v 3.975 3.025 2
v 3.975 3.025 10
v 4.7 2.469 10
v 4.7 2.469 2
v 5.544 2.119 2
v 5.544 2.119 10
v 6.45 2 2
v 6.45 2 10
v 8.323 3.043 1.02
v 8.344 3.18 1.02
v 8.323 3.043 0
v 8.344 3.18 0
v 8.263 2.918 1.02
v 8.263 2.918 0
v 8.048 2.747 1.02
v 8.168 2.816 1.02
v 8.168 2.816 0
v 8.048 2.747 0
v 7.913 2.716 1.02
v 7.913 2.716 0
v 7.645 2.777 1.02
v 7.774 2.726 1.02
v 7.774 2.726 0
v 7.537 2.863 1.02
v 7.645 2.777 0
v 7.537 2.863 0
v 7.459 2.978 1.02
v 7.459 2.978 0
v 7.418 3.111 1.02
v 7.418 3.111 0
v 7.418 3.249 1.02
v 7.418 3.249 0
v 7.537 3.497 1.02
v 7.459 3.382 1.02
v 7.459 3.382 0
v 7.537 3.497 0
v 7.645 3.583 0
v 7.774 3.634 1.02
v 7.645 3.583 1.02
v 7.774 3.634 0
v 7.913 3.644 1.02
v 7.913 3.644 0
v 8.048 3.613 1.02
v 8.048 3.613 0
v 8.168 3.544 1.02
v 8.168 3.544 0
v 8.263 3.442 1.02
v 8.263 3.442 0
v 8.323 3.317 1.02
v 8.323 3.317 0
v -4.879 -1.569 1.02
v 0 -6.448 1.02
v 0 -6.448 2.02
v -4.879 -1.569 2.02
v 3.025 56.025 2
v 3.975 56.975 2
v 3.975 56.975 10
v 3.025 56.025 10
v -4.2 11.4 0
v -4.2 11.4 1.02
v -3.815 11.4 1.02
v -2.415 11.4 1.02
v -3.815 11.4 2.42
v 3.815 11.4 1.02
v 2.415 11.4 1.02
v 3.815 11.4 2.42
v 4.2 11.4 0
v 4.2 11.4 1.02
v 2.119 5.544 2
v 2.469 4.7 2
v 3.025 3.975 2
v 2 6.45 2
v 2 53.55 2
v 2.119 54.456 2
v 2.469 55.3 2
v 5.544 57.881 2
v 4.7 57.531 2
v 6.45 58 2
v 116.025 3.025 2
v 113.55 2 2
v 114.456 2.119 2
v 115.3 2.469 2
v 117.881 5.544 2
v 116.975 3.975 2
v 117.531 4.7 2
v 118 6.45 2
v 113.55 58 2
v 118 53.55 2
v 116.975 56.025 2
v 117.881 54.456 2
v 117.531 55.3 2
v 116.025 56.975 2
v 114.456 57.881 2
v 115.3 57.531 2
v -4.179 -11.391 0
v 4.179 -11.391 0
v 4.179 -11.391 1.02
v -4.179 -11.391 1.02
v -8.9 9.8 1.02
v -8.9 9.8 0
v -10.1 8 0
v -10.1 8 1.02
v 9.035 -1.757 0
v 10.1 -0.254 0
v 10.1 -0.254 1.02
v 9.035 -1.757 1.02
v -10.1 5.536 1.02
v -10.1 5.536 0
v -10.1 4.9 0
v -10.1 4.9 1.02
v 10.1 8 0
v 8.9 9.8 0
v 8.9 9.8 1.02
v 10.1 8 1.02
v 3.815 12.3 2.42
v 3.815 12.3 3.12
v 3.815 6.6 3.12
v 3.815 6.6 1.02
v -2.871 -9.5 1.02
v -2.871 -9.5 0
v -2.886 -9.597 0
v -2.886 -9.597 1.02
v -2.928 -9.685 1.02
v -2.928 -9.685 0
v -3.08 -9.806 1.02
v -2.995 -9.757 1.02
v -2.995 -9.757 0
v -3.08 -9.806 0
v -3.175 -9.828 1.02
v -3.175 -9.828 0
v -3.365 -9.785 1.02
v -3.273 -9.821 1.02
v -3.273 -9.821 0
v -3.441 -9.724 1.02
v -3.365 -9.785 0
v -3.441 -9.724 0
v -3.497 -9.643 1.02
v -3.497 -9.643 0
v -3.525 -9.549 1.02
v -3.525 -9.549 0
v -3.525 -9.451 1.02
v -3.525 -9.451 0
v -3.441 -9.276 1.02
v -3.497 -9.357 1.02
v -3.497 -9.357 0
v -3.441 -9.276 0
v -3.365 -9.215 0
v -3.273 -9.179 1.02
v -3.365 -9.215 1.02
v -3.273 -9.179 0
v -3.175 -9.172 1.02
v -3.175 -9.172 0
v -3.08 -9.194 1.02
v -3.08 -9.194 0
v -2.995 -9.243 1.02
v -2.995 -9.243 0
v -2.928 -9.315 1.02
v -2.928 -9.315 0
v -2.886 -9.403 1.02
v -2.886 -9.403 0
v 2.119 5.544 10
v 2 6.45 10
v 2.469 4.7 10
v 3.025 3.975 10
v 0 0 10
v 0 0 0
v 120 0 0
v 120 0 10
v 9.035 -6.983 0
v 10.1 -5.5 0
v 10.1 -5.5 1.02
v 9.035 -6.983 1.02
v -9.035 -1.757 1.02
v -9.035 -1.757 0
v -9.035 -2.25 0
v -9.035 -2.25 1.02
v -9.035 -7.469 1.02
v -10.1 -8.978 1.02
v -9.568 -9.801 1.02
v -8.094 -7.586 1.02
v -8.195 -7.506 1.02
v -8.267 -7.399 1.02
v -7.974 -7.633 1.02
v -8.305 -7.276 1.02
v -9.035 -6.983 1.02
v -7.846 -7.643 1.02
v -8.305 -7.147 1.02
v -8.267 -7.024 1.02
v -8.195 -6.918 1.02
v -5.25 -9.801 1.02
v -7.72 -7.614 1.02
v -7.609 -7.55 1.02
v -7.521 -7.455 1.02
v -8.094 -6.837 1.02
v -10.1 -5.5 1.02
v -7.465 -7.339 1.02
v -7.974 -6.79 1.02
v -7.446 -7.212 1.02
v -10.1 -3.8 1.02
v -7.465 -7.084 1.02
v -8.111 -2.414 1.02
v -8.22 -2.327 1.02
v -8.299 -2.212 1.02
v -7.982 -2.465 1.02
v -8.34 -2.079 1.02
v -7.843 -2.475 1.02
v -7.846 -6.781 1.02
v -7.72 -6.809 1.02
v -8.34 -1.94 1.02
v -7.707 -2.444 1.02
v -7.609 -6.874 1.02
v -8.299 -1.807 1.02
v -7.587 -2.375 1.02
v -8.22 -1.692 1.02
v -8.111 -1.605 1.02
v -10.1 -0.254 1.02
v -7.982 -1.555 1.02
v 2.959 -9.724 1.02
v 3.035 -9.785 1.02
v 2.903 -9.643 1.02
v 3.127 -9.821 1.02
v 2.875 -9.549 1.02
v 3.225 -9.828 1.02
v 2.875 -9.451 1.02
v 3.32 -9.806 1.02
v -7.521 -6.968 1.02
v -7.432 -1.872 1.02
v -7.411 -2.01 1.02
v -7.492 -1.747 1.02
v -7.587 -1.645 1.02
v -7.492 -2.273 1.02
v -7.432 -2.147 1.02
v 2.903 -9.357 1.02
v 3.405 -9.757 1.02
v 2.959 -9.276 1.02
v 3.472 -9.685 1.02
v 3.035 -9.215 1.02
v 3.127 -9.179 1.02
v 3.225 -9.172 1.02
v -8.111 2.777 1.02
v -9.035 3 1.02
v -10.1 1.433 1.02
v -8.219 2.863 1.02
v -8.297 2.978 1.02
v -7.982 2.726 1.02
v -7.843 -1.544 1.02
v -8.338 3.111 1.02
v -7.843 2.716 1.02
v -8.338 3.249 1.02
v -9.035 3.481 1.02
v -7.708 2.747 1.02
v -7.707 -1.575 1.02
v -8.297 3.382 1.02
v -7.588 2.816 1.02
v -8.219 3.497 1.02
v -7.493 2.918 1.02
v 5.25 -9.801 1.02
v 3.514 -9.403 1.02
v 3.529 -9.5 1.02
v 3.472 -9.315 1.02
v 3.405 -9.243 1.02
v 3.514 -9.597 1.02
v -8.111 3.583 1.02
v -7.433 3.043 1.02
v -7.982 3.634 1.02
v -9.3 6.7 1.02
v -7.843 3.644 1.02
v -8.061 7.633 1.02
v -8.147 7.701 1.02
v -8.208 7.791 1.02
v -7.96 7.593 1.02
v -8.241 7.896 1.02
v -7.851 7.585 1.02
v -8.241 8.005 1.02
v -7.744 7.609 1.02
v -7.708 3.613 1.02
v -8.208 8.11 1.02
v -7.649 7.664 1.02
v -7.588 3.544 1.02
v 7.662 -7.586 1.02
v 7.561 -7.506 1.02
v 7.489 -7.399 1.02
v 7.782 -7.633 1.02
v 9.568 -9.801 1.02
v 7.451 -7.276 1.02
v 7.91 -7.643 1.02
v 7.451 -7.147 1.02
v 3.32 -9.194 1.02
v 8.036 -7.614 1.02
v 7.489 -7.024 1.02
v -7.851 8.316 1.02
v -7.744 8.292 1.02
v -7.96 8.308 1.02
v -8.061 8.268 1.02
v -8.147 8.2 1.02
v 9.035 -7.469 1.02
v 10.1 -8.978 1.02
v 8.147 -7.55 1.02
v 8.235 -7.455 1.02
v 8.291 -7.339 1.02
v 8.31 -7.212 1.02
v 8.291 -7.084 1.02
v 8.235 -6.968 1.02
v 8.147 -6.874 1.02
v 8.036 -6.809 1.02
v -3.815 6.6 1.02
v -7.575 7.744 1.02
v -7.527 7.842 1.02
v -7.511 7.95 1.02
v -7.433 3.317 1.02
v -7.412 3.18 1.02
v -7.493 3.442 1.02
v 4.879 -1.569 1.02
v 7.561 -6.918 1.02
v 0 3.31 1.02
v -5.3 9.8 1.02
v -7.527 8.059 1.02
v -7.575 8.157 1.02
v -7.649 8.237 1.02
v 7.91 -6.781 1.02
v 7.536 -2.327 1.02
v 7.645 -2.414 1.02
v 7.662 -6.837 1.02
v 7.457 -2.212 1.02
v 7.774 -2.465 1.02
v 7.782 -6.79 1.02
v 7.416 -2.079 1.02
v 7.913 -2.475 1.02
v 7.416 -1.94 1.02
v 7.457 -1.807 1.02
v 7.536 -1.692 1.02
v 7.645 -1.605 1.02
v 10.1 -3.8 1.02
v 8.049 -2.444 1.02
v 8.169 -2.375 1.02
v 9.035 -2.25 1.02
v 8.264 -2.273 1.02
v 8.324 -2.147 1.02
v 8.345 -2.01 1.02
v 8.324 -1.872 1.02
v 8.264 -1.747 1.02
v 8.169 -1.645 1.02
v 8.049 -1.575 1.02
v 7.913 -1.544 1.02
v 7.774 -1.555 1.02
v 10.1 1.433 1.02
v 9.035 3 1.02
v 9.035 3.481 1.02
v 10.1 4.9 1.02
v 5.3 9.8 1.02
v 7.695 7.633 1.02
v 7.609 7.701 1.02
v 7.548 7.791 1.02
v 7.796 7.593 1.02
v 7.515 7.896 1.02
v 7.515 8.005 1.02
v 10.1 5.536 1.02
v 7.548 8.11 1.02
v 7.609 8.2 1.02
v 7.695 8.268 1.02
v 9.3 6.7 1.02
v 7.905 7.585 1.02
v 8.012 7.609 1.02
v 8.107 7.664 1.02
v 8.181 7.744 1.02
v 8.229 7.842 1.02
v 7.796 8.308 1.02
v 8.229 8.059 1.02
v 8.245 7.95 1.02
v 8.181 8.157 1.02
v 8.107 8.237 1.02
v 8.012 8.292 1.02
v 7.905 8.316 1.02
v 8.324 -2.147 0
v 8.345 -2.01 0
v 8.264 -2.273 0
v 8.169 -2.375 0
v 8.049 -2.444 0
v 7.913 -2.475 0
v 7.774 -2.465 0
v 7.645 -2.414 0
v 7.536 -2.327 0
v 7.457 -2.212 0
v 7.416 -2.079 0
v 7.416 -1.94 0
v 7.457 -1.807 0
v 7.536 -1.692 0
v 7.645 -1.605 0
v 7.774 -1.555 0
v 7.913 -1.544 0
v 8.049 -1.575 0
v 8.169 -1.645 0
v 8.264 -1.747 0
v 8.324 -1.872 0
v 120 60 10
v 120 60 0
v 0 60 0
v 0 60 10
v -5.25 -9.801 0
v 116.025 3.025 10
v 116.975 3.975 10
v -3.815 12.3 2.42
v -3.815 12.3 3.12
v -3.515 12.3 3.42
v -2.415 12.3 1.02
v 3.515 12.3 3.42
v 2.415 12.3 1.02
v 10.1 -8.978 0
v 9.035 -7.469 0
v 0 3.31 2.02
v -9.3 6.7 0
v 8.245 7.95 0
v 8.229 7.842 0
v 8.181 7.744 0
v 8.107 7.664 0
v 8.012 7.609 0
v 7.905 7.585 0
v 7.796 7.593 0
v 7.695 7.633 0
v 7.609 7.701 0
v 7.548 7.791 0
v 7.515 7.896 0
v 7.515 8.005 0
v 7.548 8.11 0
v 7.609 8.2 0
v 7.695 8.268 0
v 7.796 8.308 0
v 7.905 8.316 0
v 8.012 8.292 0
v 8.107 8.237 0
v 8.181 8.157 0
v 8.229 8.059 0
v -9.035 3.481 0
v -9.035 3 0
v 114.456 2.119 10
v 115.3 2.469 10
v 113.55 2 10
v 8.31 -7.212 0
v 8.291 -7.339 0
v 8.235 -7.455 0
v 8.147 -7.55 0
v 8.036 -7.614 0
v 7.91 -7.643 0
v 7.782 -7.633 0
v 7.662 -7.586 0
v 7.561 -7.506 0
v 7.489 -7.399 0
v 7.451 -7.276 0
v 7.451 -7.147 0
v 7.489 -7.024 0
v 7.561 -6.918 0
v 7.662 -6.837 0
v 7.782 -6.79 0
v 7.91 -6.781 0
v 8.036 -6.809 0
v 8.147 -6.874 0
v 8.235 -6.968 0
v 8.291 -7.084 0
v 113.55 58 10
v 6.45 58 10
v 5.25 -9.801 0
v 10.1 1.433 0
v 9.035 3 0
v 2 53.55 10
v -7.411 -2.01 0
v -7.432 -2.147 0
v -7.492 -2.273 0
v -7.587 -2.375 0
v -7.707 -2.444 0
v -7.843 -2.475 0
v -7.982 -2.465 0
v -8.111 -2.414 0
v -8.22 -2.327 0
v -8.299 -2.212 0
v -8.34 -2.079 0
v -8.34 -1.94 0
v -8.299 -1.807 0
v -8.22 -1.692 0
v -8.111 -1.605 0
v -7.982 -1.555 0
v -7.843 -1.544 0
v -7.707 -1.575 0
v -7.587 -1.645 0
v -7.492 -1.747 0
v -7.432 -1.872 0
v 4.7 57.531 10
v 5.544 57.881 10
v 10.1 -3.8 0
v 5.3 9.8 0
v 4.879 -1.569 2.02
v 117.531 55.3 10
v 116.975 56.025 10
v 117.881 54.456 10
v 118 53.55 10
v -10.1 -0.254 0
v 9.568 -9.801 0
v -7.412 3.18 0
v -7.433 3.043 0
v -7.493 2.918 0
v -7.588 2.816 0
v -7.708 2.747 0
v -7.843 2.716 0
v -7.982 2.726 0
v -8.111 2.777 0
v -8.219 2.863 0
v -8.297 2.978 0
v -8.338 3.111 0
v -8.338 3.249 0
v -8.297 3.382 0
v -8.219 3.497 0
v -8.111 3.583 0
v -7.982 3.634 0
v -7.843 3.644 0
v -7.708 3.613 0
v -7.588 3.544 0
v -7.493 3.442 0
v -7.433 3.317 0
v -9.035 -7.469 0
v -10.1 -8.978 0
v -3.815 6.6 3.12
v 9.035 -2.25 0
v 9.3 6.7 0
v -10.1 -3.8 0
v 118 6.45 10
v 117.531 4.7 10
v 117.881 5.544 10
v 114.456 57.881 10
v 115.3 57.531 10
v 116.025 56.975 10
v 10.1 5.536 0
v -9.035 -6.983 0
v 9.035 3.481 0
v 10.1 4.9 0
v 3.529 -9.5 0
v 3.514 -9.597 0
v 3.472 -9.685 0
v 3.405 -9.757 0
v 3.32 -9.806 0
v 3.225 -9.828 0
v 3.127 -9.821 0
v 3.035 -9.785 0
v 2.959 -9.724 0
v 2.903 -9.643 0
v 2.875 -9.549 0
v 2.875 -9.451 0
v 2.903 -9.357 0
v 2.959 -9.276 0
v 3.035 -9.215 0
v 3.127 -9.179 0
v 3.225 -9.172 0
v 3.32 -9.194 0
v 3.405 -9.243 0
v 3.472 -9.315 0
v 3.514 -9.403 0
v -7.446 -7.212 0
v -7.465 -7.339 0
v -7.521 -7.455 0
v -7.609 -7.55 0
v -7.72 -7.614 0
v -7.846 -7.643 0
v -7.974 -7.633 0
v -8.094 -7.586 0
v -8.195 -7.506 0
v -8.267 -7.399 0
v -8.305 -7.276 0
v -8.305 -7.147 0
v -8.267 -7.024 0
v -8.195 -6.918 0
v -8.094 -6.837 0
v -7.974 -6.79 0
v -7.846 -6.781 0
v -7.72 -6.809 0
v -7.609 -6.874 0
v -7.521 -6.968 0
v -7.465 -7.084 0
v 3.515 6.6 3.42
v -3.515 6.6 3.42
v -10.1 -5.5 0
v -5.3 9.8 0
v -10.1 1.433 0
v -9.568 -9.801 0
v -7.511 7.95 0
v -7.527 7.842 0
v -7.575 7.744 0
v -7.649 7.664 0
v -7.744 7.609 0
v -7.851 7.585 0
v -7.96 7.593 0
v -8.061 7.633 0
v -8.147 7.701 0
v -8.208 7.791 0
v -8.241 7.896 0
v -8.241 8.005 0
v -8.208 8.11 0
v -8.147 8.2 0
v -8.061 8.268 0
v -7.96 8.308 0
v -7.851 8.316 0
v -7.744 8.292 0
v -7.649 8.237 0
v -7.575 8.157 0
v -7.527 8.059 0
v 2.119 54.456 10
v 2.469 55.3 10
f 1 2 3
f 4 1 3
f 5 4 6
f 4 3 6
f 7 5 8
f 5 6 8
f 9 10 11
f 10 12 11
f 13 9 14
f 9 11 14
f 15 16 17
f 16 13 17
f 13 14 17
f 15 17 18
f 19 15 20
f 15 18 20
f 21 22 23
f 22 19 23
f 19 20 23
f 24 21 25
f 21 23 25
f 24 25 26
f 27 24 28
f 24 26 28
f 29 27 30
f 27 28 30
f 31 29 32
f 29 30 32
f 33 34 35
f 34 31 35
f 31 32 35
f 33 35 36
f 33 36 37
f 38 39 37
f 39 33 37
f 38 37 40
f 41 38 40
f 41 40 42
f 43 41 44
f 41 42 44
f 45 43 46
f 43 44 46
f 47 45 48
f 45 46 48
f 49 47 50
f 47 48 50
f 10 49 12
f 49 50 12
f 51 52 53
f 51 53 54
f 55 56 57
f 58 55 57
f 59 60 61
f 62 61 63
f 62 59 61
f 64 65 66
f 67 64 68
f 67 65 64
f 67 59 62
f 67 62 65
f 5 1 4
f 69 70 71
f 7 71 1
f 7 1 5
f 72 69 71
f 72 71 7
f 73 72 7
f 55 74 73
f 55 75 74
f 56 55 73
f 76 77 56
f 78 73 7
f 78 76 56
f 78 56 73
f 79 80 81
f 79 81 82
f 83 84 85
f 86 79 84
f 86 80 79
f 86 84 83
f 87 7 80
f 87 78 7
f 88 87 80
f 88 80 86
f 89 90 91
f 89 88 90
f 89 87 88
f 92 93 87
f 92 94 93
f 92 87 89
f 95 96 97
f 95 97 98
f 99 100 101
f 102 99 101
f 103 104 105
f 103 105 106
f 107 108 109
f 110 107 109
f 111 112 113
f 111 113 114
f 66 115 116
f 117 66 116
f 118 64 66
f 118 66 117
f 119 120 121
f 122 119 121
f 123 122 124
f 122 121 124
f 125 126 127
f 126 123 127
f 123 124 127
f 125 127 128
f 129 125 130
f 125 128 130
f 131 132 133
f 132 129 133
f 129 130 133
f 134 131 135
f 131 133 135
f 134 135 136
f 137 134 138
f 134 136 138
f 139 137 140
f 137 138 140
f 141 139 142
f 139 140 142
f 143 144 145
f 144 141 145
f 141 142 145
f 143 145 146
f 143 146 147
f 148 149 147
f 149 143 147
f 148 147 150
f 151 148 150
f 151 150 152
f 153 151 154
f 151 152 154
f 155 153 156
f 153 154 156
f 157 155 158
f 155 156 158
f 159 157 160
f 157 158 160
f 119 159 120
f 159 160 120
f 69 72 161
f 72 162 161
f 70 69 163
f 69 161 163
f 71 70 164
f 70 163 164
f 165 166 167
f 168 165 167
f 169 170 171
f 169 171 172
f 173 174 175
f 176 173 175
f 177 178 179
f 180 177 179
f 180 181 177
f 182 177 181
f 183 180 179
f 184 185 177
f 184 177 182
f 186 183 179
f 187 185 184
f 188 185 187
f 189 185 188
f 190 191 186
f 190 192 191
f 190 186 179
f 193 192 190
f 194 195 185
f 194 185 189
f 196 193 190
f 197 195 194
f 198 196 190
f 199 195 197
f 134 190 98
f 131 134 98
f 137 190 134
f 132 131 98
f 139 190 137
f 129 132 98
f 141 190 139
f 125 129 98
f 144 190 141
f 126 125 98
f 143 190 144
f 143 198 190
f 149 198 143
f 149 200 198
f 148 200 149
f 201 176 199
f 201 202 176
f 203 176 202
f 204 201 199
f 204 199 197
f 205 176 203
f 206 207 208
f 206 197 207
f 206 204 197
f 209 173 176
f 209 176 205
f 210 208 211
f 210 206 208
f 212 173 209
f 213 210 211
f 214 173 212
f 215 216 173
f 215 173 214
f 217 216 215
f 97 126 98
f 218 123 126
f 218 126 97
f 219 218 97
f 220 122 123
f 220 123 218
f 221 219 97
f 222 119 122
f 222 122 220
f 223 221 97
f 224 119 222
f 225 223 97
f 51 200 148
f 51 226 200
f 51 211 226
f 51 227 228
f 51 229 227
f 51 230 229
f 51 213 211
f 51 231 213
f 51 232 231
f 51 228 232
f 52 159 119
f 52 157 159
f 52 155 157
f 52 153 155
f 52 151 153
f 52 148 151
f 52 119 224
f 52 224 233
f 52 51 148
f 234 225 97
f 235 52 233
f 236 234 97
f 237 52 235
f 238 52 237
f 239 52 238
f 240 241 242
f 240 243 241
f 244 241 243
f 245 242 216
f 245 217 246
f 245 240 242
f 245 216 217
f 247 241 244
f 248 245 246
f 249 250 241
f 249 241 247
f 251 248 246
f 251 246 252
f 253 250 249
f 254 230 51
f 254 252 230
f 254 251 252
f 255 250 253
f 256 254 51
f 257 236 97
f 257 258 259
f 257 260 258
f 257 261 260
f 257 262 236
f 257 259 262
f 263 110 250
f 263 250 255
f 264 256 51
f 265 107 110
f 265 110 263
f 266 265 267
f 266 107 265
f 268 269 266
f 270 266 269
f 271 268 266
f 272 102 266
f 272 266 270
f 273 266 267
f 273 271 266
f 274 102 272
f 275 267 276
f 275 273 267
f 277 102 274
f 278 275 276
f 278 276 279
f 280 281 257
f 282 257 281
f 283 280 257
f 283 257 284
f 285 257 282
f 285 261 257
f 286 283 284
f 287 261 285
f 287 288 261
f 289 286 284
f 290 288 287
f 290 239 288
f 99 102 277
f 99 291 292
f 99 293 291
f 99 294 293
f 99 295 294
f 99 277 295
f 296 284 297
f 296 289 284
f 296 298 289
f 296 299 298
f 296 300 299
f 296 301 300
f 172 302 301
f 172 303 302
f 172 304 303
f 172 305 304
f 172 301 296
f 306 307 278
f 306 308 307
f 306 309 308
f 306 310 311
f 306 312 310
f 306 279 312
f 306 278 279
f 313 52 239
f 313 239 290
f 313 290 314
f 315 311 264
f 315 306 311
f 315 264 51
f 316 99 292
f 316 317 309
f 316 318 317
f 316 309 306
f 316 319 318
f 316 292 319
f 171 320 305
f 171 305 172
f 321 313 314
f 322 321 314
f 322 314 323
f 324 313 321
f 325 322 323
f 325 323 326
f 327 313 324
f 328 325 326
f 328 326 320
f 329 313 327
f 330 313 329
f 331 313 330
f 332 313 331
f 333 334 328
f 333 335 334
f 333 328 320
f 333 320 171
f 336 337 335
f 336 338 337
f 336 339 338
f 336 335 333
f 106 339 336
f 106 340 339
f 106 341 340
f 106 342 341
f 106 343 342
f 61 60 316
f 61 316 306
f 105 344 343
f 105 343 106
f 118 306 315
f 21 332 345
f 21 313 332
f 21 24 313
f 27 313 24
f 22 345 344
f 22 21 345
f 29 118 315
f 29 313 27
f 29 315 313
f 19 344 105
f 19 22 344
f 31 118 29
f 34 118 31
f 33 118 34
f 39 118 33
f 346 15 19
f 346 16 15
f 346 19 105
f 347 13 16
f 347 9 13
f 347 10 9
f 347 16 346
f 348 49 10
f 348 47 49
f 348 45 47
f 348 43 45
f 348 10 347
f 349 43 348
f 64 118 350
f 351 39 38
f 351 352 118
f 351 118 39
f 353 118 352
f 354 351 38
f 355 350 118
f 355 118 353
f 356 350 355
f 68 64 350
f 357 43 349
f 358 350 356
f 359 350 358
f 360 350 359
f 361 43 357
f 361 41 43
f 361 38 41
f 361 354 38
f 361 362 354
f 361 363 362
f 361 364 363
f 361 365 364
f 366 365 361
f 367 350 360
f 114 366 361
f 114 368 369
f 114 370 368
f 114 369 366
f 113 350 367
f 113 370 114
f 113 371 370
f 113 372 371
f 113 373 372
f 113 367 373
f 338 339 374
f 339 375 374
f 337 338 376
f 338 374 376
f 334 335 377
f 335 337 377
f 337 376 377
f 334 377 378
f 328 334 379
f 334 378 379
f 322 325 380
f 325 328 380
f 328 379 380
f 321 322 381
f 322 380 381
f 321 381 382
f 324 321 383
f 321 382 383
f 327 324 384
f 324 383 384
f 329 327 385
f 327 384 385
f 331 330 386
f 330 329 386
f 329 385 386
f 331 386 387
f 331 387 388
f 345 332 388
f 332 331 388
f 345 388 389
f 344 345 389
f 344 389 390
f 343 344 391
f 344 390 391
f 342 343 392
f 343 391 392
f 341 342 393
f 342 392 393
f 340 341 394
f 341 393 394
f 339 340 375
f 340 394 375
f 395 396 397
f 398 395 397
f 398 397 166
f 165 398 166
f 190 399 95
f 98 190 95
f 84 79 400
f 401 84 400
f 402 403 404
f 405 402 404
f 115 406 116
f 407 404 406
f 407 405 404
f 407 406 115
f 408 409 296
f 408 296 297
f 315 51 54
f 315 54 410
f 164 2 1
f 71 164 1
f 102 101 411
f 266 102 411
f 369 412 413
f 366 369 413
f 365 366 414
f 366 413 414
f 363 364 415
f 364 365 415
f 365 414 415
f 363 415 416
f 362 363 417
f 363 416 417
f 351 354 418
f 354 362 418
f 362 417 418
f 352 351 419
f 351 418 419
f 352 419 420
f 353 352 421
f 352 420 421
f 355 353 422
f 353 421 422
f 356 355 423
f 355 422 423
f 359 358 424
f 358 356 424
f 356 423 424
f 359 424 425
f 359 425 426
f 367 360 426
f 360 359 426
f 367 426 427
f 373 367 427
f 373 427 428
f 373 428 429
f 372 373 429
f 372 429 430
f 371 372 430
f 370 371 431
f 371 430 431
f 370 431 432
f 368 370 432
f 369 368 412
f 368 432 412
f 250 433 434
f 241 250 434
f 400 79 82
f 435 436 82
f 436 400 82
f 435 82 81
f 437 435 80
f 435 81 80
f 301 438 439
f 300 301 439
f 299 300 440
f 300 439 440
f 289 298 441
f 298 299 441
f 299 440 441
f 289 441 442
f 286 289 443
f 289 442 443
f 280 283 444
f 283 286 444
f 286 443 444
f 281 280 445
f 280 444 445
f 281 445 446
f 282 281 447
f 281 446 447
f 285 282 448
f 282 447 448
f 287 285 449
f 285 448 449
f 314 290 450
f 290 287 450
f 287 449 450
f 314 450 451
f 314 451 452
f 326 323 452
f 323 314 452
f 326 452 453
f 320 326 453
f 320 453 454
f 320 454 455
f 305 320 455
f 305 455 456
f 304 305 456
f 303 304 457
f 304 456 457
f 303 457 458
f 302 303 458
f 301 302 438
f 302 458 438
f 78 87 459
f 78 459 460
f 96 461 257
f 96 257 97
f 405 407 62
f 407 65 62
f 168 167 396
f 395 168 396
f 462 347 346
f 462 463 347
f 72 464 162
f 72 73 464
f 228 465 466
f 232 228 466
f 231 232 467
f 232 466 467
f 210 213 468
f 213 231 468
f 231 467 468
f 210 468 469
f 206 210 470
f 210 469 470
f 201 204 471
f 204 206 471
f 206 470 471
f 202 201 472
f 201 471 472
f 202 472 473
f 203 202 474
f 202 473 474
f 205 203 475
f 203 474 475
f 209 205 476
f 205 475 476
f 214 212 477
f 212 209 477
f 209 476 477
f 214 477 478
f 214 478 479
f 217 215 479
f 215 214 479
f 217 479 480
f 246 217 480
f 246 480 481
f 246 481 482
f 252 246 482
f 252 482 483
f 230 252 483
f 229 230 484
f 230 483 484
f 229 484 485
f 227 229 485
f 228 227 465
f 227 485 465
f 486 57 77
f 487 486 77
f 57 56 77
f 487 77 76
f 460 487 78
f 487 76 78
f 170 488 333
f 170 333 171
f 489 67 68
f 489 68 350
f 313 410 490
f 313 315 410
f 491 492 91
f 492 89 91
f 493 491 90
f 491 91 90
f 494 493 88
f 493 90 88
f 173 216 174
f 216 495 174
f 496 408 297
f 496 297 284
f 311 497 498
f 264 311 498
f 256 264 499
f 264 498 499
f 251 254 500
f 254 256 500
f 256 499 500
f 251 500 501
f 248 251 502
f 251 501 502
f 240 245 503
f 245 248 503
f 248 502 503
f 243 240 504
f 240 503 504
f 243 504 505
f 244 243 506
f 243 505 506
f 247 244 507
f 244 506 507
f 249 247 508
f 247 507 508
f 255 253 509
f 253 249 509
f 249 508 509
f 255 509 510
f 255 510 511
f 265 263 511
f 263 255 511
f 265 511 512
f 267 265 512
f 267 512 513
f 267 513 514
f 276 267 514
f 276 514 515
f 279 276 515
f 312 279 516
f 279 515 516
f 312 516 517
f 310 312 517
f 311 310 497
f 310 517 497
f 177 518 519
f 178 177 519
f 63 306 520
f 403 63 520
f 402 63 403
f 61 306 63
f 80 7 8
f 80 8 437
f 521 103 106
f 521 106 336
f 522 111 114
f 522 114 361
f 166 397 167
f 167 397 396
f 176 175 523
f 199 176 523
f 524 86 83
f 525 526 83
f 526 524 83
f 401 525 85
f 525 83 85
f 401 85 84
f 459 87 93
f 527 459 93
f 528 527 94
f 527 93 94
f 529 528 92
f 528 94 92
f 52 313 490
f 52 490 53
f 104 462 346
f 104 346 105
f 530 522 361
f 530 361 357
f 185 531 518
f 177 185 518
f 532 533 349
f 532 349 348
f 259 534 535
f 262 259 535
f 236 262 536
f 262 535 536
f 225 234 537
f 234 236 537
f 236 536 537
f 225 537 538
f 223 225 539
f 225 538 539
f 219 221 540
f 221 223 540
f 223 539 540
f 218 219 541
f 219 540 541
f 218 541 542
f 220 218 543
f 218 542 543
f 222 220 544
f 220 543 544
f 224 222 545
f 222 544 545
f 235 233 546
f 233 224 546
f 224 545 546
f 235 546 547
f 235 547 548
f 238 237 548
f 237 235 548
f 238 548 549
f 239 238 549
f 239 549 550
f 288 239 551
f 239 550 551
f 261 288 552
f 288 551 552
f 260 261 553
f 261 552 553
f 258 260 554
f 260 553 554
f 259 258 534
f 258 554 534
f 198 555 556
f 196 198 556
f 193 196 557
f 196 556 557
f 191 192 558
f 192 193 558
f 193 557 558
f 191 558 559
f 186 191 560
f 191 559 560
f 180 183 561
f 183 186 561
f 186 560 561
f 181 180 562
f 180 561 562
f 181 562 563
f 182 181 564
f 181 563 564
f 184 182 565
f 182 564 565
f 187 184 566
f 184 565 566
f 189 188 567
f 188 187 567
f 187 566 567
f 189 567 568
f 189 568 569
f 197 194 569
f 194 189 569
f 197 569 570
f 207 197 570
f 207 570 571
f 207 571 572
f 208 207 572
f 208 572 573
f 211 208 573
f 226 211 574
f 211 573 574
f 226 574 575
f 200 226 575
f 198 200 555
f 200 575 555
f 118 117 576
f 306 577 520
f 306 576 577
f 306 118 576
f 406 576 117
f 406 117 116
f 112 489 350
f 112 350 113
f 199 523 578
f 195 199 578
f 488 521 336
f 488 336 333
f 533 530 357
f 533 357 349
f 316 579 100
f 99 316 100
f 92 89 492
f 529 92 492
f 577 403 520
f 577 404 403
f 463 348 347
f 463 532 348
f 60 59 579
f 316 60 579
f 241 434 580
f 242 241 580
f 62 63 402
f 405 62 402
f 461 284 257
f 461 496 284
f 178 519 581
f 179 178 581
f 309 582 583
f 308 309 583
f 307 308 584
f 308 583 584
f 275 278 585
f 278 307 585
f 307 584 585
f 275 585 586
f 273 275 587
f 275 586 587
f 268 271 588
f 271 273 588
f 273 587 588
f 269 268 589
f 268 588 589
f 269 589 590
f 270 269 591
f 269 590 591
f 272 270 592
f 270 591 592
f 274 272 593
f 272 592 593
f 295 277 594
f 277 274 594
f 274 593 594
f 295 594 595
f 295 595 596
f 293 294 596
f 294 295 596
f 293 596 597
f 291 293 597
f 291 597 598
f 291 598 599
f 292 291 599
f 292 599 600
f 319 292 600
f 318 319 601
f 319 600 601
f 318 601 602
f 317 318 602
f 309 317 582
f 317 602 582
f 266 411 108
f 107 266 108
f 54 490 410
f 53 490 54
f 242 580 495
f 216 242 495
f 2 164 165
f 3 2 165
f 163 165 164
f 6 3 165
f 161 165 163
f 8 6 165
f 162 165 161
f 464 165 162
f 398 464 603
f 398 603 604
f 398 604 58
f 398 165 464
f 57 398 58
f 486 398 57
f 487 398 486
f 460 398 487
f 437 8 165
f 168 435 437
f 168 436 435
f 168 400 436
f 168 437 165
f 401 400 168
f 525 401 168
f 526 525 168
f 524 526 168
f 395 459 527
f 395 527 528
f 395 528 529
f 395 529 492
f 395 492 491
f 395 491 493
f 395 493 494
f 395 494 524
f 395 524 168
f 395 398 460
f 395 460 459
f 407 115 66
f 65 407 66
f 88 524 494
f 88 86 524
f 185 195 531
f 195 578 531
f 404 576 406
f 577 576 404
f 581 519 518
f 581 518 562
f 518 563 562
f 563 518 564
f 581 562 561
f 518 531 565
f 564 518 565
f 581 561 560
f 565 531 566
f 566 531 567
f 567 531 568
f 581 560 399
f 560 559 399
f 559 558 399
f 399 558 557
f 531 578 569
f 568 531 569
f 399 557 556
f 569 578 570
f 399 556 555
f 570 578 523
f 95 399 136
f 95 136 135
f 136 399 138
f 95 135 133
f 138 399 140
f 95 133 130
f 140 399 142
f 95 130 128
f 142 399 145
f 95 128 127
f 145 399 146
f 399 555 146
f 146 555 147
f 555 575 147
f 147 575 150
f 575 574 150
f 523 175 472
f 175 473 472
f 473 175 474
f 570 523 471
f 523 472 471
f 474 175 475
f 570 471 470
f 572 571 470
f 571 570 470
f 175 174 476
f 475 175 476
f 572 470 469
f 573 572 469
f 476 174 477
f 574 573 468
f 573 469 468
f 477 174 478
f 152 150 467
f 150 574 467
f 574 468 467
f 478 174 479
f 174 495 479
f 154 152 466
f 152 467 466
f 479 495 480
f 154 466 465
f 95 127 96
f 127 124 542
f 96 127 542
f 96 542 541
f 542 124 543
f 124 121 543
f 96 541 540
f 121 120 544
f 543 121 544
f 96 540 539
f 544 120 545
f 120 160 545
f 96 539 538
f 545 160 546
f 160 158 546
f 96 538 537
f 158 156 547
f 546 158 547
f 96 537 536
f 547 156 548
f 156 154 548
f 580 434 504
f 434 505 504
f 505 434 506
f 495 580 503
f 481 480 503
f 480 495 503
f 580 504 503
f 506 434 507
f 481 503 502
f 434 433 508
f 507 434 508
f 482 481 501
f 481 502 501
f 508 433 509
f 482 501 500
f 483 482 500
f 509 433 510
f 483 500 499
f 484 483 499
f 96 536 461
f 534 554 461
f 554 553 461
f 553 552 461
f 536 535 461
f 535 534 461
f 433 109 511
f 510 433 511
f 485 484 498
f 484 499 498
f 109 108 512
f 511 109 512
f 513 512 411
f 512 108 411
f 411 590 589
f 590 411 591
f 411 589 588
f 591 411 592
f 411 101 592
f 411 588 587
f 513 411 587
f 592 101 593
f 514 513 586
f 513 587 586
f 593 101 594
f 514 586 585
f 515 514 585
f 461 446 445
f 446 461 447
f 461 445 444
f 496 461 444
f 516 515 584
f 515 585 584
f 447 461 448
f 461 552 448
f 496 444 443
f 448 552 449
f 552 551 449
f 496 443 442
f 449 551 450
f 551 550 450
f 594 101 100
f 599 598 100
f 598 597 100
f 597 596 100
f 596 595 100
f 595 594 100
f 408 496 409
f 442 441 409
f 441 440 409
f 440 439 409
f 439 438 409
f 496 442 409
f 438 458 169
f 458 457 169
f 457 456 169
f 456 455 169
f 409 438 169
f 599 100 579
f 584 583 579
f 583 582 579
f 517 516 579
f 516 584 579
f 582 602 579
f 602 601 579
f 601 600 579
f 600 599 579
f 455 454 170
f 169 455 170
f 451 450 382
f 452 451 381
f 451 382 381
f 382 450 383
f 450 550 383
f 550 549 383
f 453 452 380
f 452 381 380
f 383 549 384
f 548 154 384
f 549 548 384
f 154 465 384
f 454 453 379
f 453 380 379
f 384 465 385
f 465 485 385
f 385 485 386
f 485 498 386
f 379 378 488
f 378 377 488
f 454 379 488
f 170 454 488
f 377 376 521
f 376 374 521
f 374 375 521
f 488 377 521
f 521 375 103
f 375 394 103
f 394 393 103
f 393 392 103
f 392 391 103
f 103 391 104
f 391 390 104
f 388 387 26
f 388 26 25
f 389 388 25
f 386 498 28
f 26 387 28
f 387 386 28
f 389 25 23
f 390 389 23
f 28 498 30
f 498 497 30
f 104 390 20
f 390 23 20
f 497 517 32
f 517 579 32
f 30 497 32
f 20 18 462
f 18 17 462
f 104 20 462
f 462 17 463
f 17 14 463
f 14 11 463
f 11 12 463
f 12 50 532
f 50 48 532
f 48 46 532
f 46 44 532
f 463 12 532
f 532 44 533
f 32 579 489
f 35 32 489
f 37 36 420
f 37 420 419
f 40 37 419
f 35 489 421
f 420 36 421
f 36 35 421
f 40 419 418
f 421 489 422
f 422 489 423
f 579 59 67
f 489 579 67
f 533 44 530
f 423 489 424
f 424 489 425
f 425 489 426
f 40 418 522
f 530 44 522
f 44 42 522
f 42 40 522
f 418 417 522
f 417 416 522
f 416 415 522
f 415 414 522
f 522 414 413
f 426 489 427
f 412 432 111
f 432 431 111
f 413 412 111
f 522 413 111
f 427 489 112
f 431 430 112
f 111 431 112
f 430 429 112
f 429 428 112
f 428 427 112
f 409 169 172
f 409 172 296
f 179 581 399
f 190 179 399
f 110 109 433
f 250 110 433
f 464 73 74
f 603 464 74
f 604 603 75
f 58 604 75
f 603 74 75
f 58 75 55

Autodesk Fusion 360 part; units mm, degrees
sketch "Sketch1" plane through (0, 0, 0) normal (0, 0, 1) x (1, 0, 0)
  line L0 (0, 0) -> (120, 0)
  line L1 (120, 0) -> (120, 60)
  line L2 (120, 60) -> (0, 60)
  line L3 (0, 60) -> (0, 0)
  dimension "d1" = 120
  dimension "d2" = 60
extrude "Extrude1" add sketch "Sketch1" along normal blind 10 makes body 1
shell "Shell1" thickness 2 removed faces 1 at (40, 20, 10) on bodies 1
chamfer "Chamfer1" distance 3 angle 45 4 edges at (2, 58, 6) (118, 58, 6) (2, 2, 6) (118, 2, 6) on bodies 1
fillet "Fillet1" radius 3.5 8 edges at (2, 5, 6) (5, 2, 6) (115, 2, 6) (118, 5, 6) (118, 55, 6) (115, 58, 6) (5, 58, 6) (2, 55, 6) on bodies 1
sketch "Sketch1 (2)" plane through (0, 0, 0) normal (0, 0, 1) x (1, 0, 0) in component "beetle_board"
  line L0 (0, 11.4) -> (4.2, 11.4)
  line L1 (4.2, 11.4) -> (5.3, 9.8)
  line L2 (5.3, 9.8) -> (8.9, 9.8)
  line L3 (8.9, 9.8) -> (10.1, 8)
  line L4 (10.1, 8) -> (9.3, 6.7)
  line L5 (9.3, 6.7) -> (10.1, 5.5364)
  line L6 (10.1, 5.5364) -> (10.1, 4.9)
  line L7 (10.1, 4.9) -> (9.035, 3.481)
  line L8 (9.035, 3.481) -> (9.035, 3)
  line L9 (9.035, 3) -> (10.1, 1.4334)
  line L10 (10.1, 1.4334) -> (10.1, -0.2538)
  line L11 (10.1, -0.2538) -> (9.035, -1.7573)
  line L12 (9.035, -1.7573) -> (9.035, -2.25)
  line L13 (9.035, -2.25) -> (10.1, -3.8)
  line L14 (10.1, -3.8) -> (10.1, -5.5)
  line L15 (10.1, -5.5) -> (9.035, -6.9826)
  line L16 (9.035, -6.9826) -> (9.035, -7.4692)
  line L17 (9.035, -7.4692) -> (10.1, -8.9776)
  line L18 (10.1, -8.9776) -> (9.5675, -9.8011)
  line L19 (9.5675, -9.8011) -> (5.25, -9.8011)
  line L20 (5.25, -9.8011) -> (4.1787, -11.3908)
  line L21 (4.1787, -11.3908) -> (0, -11.3908)
  circle A0 centre (7.878, 7.9505) radius 0.3668
  circle A1 centre (7.878, 3.1799) radius 0.4655
  circle A2 centre (7.878, -2.0097) radius 0.4668
  circle A3 centre (7.878, -7.2117) radius 0.4322
  circle A4 centre (3.2, -9.5) radius 0.3291
  line L22 (0, 15) -> (0, -15) construction
  line L23 (-10.1, 1.4334) -> (-10.1, -0.2538)
  line L24 (-10.1, -3.8) -> (-10.1, -5.5)
  line L25 (-10.1, -0.2538) -> (-9.035, -1.7573)
  line L26 (-9.035, -6.9826) -> (-9.035, -7.4692)
  line L27 (-5.3, 9.8) -> (-8.9, 9.8)
  line L28 (-9.035, -1.7573) -> (-9.035, -2.25)
  circle A5 centre (-7.878, -7.2117) radius 0.4322
  line L29 (-9.035, -7.4692) -> (-10.1, -8.9776)
  line L30 (-9.035, -2.25) -> (-10.1, -3.8)
  line L31 (-10.1, -8.9776) -> (-9.5675, -9.8011)
  circle A6 centre (-7.878, 7.9505) radius 0.3668
  line L32 (-10.1, 8) -> (-9.3, 6.7)
  line L33 (0, 11.4) -> (-4.2, 11.4)
  line L34 (-10.1, 5.5364) -> (-10.1, 4.9)
  line L35 (-9.035, 3.481) -> (-9.035, 3)
  line L36 (-4.1787, -11.3908) -> (0, -11.3908)
  line L37 (-9.035, 3) -> (-10.1, 1.4334)
  line L38 (-4.2, 11.4) -> (-5.3, 9.8)
  line L39 (-10.1, 4.9) -> (-9.035, 3.481)
  line L40 (-8.9, 9.8) -> (-10.1, 8)
  line L41 (-9.5675, -9.8011) -> (-5.25, -9.8011)
  line L42 (-10.1, -5.5) -> (-9.035, -6.9826)
  circle A7 centre (-7.878, 3.1799) radius 0.4655
  line L43 (-9.3, 6.7) -> (-10.1, 5.5364)
  line L44 (-5.25, -9.8011) -> (-4.1787, -11.3908)
  circle A8 centre (-3.2, -9.5) radius 0.3291
  circle A9 centre (-7.878, -2.0097) radius 0.4668
extrude "Extrude1'" add sketch "Sketch1 (2)" along normal blind 1.02 separate body makes body 2 in component "beetle_board"
sketch "Sketch2" plane through (0, 0, 1.02) normal (0, 0, 1) x (-1, 0, 0) in component "beetle_board"
  circle A0 centre (-7.878, -7.9505) radius 0.3668
  circle A1 centre (7.878, 2.0097) radius 0.4668
  circle A2 centre (3.2, 9.5) radius 0.3291
  circle A3 centre (7.878, -3.1799) radius 0.4655
  circle A4 centre (7.878, -7.9505) radius 0.3668
  circle A5 centre (7.878, 7.2117) radius 0.4322
  circle A6 centre (-3.2, 9.5) radius 0.3291
  circle A7 centre (-7.878, 7.2117) radius 0.4322
  circle A8 centre (-7.878, 2.0097) radius 0.4668
  circle A9 centre (-7.878, -3.1799) radius 0.4655
  line L0 (-4.2, -11.4) -> (4.2, -11.4)
  line L1 (4.2, -11.4) -> (5.3, -9.8)
  line L2 (5.3, -9.8) -> (8.9, -9.8)
  line L3 (8.9, -9.8) -> (10.1, -8)
  line L4 (10.1, -8) -> (9.3, -6.7)
  line L5 (9.3, -6.7) -> (10.1, -5.5364)
  line L6 (10.1, -5.5364) -> (10.1, -4.9)
  line L7 (10.1, -4.9) -> (9.035, -3.481)
  line L8 (9.035, -3.481) -> (9.035, -3)
  line L9 (9.035, -3) -> (10.1, -1.4334)
  line L10 (10.1, -1.4334) -> (10.1, 0.2538)
  line L11 (10.1, 0.2538) -> (9.035, 1.7573)
  line L12 (9.035, 1.7573) -> (9.035, 2.25)
  line L13 (9.035, 2.25) -> (10.1, 3.8)
  line L14 (10.1, 3.8) -> (10.1, 5.5)
  line L15 (10.1, 5.5) -> (9.035, 6.9826)
  line L16 (9.035, 6.9826) -> (9.035, 7.4692)
  line L17 (9.035, 7.4692) -> (10.1, 8.9776)
  line L18 (10.1, 8.9776) -> (9.5675, 9.8011)
  line L19 (9.5675, 9.8011) -> (5.25, 9.8011)
  line L20 (5.25, 9.8011) -> (4.1787, 11.3908)
  line L21 (4.1787, 11.3908) -> (-4.1787, 11.3908)
  line L22 (-4.1787, 11.3908) -> (-5.25, 9.8011)
  line L23 (-5.25, 9.8011) -> (-9.5675, 9.8011)
  line L24 (-9.5675, 9.8011) -> (-10.1, 8.9776)
  line L25 (-10.1, 8.9776) -> (-9.035, 7.4692)
  line L26 (-9.035, 7.4692) -> (-9.035, 6.9826)
  line L27 (-9.035, 6.9826) -> (-10.1, 5.5)
  line L28 (-10.1, 5.5) -> (-10.1, 3.8)
  line L29 (-10.1, 3.8) -> (-9.035, 2.25)
  line L30 (-9.035, 2.25) -> (-9.035, 1.7573)
  line L31 (-9.035, 1.7573) -> (-10.1, 0.2538)
  line L32 (-10.1, 0.2538) -> (-10.1, -1.4334)
  line L33 (-10.1, -1.4334) -> (-9.035, -3)
  line L34 (-9.035, -3) -> (-9.035, -3.481)
  line L35 (-9.035, -3.481) -> (-10.1, -4.9)
  line L36 (-10.1, -4.9) -> (-10.1, -5.5364)
  line L37 (-10.1, -5.5364) -> (-9.3, -6.7)
  line L38 (-9.3, -6.7) -> (-10.1, -8)
  line L39 (-10.1, -8) -> (-8.9, -9.8)
  line L40 (-8.9, -9.8) -> (-5.3, -9.8)
  line L41 (-5.3, -9.8) -> (-4.2, -11.4)
  line L42 (-3.815, -6.6) -> (3.815, -6.6)
  line L43 (3.815, -6.6) -> (3.815, -12.3)
  line L44 (3.815, -12.3) -> (-3.815, -12.3)
  line L45 (-3.815, -12.3) -> (-3.815, -6.6)
  line L46 (-3.815, -6.6) -> (3.815, -12.3) construction
  line L47 (3.815, -6.6) -> (-3.815, -12.3) construction
  line L48 (-4.879, 1.5692) -> (0, 6.4482)
  line L49 (0, 6.4482) -> (4.879, 1.5692)
  line L50 (4.879, 1.5692) -> (0, -3.3099)
  line L51 (0, -3.3099) -> (-4.879, 1.5692)
  line L52 (-4.879, 1.5692) -> (4.879, 1.5692) construction
  line L53 (0, 6.4482) -> (0, -3.3099) construction
  point P0 (0, -9.45)
  point P1 (0, 1.5692)
  dimension "d80" = 7.63
  dimension "d81" = 5.7
  dimension "d82" = 0.9
  dimension "d85" = 6.9
  dimension "d86" = 6.9
extrude "Extrude2" add sketch "Sketch2" along normal blind 1 contours L48 L49 L50 L51 bodies 2 in component "beetle_board"
extrude "Extrude3" add sketch "Sketch2" along normal blind 2.4 contours L0 L42 L43 L45 | L0 L43 L44 L45 bodies 2 in component "beetle_board"
chamfer "Chamfer1'" distance 1.4 angle 45 2 edges at (3.815, 11.85, 1.02) (-3.815, 11.85, 1.02) on bodies 2 in component "beetle_board"
chamfer "Chamfer2" distance 0.3 angle 45 2 edges at (3.815, 9.45, 3.42) (-3.815, 9.45, 3.42) on bodies 2 in component "beetle_board"
component "beetle_board" placed x (1, 0, 0) y (0, 1, 0) z (0, 0, 1) at (0, 0, 0)
